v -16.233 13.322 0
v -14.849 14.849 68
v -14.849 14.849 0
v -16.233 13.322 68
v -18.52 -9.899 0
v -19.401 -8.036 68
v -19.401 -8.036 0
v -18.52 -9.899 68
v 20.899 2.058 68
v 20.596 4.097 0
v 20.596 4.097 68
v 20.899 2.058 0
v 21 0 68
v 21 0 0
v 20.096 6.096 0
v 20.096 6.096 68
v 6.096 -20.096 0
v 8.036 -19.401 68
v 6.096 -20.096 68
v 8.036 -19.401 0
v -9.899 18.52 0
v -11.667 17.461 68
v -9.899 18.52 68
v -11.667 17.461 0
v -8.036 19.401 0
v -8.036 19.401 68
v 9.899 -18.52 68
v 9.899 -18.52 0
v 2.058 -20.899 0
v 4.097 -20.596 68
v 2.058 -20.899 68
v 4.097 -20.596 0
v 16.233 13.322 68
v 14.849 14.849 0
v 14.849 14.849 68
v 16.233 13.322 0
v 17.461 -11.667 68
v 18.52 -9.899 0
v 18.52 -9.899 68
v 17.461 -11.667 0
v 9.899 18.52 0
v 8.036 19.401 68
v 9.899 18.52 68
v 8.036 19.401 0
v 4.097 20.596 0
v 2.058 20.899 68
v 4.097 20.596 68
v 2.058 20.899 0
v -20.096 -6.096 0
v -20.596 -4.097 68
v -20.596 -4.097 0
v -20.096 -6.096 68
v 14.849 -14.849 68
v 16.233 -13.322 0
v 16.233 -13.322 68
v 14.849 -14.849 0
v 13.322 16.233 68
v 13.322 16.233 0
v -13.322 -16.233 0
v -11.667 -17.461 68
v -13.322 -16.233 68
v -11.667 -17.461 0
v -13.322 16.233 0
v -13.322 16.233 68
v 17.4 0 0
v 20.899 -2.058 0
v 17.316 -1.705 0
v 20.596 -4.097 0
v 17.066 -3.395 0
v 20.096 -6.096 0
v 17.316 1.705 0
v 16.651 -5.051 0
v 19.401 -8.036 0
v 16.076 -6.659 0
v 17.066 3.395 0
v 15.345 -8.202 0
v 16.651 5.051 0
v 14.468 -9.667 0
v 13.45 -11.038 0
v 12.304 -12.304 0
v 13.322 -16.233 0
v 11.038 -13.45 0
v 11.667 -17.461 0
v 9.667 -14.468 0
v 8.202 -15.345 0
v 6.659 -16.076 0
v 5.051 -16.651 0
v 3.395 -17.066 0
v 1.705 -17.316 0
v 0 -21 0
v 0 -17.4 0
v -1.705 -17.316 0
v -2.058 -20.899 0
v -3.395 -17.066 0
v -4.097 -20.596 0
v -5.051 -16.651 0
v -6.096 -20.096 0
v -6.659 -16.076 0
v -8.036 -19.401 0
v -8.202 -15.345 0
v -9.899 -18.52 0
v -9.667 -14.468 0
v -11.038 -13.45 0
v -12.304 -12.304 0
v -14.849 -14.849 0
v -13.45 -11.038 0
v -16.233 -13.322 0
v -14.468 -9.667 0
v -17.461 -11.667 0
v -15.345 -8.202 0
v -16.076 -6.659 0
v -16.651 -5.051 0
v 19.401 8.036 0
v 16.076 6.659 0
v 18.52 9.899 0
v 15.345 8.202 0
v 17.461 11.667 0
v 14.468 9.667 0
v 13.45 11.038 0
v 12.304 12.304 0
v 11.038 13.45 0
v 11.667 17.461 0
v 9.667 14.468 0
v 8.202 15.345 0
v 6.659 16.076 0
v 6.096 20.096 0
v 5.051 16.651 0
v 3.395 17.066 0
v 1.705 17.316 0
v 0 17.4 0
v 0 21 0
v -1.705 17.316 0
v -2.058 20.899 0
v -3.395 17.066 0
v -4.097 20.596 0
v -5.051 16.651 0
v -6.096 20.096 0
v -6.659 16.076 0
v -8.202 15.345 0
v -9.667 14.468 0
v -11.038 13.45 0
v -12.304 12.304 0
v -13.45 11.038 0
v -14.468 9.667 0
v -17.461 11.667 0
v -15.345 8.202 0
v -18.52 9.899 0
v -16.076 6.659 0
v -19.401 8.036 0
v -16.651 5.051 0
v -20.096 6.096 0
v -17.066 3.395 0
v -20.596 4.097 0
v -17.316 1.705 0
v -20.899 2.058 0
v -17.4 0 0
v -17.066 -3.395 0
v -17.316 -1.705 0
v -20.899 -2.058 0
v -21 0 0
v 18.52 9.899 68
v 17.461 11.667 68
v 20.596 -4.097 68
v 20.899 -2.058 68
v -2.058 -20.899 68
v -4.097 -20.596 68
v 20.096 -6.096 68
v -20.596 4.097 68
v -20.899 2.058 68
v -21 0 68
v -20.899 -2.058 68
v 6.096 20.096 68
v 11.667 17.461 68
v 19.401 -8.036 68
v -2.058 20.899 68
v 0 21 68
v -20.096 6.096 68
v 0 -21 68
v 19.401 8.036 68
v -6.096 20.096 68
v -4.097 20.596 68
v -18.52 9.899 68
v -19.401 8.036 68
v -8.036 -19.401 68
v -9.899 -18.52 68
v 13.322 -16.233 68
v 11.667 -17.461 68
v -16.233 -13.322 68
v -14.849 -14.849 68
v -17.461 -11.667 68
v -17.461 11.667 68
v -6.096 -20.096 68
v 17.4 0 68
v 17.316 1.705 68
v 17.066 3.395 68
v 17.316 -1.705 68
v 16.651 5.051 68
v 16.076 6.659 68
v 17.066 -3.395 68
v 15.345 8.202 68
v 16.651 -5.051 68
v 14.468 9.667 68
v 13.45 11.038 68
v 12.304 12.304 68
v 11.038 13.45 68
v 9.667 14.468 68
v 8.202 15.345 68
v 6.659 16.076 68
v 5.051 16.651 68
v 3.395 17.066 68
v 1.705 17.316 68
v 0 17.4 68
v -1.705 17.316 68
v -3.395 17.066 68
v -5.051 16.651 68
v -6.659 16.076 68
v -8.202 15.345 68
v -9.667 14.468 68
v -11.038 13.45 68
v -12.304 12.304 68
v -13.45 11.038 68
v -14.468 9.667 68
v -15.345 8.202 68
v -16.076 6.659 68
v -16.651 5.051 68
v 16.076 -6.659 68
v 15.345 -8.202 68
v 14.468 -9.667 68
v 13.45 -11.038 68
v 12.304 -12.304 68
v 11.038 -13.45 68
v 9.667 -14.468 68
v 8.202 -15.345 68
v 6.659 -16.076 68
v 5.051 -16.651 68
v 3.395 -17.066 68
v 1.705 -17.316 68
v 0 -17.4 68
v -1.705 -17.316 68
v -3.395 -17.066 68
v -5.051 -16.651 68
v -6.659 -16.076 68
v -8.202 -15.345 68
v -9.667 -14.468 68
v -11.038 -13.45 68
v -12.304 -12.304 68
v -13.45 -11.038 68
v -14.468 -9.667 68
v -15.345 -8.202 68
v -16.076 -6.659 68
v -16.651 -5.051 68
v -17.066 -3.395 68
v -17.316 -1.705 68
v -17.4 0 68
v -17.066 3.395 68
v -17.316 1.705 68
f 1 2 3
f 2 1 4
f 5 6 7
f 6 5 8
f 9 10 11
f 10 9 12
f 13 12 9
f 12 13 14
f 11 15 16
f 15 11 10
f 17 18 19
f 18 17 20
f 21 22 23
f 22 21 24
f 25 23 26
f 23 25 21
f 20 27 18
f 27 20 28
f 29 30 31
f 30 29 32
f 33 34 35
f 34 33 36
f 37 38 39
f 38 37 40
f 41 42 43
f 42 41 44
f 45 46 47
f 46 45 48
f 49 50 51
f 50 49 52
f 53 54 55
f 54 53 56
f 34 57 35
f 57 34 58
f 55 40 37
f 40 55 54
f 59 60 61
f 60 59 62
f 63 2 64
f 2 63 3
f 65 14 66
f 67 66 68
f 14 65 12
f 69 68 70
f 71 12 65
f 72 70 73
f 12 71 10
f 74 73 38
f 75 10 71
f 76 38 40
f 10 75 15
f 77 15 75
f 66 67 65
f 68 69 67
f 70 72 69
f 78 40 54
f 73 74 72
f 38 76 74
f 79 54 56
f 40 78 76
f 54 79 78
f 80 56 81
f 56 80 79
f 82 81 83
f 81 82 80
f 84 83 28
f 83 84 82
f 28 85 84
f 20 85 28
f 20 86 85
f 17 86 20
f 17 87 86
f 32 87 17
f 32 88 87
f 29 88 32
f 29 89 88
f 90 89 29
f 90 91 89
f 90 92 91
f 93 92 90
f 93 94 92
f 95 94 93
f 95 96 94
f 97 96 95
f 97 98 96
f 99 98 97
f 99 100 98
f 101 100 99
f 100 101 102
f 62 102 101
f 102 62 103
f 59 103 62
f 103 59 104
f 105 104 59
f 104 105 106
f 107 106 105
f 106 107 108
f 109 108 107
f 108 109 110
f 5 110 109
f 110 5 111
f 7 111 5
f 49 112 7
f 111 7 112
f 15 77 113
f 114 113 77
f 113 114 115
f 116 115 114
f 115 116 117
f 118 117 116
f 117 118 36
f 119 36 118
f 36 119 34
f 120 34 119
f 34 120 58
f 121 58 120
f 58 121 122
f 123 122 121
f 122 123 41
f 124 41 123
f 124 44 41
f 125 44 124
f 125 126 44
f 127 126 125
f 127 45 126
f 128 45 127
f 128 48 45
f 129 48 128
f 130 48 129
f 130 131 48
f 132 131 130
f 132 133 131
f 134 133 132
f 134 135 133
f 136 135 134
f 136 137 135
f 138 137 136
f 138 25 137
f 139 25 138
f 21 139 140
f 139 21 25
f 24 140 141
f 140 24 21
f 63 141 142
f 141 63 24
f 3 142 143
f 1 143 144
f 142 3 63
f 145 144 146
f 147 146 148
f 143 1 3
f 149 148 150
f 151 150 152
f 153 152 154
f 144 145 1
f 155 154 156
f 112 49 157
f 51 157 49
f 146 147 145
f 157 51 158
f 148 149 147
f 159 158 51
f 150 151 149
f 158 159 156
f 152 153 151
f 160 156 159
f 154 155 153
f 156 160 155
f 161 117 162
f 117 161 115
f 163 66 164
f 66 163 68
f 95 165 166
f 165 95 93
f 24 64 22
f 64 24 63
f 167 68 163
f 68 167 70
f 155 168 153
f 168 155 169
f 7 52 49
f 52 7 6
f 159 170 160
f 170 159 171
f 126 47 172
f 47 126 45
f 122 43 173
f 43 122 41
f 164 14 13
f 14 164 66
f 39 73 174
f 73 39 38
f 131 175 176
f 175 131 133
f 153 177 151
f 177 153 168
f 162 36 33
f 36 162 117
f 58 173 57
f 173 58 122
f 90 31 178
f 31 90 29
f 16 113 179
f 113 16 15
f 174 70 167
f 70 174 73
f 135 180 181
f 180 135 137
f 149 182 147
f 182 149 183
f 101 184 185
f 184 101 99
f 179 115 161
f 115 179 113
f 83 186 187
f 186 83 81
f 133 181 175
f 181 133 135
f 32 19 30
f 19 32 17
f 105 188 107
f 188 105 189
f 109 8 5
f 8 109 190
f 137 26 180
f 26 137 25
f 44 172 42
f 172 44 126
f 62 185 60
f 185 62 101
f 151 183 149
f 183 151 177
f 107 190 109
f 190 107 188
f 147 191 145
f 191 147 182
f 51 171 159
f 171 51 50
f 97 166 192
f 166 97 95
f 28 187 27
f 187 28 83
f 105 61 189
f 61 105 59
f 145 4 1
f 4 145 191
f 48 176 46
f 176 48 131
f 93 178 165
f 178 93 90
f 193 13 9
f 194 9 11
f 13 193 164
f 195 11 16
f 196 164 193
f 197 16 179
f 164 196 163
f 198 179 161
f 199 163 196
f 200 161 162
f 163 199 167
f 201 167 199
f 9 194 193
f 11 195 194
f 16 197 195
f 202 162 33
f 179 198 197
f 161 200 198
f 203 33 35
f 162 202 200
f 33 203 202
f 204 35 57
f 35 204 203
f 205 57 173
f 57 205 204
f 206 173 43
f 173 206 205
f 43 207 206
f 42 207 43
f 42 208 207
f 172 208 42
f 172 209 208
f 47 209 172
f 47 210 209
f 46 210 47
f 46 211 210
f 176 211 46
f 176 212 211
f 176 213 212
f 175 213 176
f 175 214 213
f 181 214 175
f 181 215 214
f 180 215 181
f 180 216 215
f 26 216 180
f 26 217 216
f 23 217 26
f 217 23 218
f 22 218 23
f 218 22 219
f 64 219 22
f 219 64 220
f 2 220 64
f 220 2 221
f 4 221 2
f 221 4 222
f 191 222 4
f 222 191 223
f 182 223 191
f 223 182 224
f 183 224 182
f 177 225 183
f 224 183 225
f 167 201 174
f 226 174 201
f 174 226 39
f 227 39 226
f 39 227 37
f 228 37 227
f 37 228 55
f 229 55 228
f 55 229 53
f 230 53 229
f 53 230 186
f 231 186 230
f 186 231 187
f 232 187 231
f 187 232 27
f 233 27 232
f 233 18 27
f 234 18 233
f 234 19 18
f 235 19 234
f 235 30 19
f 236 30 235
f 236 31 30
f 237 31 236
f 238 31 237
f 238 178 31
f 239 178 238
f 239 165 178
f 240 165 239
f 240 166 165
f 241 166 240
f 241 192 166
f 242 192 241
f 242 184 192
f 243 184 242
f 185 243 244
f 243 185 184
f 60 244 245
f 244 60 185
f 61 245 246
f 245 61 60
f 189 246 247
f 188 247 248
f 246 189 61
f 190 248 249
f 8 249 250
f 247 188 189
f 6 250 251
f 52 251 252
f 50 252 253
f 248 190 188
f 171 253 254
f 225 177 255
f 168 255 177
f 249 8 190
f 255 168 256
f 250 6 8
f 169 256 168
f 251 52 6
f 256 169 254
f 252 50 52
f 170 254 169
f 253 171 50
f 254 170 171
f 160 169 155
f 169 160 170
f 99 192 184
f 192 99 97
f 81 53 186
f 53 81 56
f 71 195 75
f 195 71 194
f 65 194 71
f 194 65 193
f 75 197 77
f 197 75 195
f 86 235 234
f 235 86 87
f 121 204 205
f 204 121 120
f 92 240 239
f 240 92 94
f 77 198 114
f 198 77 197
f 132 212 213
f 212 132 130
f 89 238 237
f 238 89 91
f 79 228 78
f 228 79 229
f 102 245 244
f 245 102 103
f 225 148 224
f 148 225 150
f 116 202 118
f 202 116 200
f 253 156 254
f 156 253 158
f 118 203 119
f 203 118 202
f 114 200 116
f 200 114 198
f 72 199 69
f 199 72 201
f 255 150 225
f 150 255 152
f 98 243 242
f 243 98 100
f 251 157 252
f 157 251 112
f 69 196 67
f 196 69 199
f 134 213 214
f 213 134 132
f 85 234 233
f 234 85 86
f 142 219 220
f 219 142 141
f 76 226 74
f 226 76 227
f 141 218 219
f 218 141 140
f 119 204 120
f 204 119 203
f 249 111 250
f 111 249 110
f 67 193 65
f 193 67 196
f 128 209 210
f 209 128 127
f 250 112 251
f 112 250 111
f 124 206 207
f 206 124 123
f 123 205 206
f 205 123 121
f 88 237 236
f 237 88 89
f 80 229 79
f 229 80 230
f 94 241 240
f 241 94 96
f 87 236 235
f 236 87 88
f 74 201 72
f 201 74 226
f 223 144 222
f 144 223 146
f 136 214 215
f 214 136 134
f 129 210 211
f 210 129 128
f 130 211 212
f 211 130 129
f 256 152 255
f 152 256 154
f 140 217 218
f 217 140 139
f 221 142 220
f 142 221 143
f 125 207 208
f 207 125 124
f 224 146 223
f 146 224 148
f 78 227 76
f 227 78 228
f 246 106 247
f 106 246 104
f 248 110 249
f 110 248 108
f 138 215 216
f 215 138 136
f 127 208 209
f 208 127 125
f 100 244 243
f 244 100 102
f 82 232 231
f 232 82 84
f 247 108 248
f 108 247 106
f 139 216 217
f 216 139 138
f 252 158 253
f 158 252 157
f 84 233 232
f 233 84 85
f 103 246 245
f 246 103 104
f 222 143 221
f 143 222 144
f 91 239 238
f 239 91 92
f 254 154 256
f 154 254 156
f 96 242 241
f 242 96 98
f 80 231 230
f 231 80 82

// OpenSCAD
// file: ../../config.scad
// Ebike Configuration
// All dimensions in mm

// =============================================================================
// RIDER PARAMETERS
// =============================================================================
rider_height = 173;
rider_weight = 55;

// =============================================================================
// FRAME GEOMETRY
// =============================================================================
frame_size = 520;                    // Seat tube center-to-top
top_tube_effective = 545;
head_tube_length = 140;
head_tube_angle = 70;
seat_tube_angle = 72;
chainstay_length = 460;
bb_drop = 65;
wheelbase = 1080;
standover_height = 450;              // Step-through
stack = 620;
reach = 370;

// =============================================================================
// TUBE DIAMETERS
// =============================================================================
head_tube_id = 44;                   // 1-1/8" straight steerer
head_tube_od = 49;
seat_tube_id = 27.2;                 // Standard seatpost
down_tube_od = 44;
top_tube_od = 32;
seat_stay_od = 16;
chainstay_od = 22;

// =============================================================================
// MOTOR CONFIGURATION
// =============================================================================
motor_type = "mid-drive";
bb_shell_width = 68;                 // BSA standard
bb_clearance_width = 120;

// =============================================================================
// DROPOUT PARAMETERS
// =============================================================================
dropout_material = "6061-T6";
dropout_thickness = 10;
dropout_width = 45;
dropout_height = 80;
dropout_axle_spacing = 142;          // Boost thru-axle
dropout_axle_diameter = 12;

// =============================================================================
// BOTTOM BRACKET SHELL
// =============================================================================
bb_shell_od = 42;
bb_shell_id = 34.8;                  // BSA threaded
bb_thread_tpi = 24;                  // BSA 1.37" x 24 TPI

// =============================================================================
// HEAD TUBE
// =============================================================================
// Uses head_tube_length, head_tube_id, head_tube_od from above

// =============================================================================
// SEAT COLLAR
// =============================================================================
seat_collar_id = 31.8;               // For 27.2mm post with shim
seat_collar_od = 38;
seat_collar_height = 25;

// =============================================================================
// MOTOR MOUNT
// =============================================================================
motor_mount_thickness = 8;
motor_mount_width = 120;
motor_mount_height = 100;

// =============================================================================
// BATTERY MOUNT
// =============================================================================
battery_mount_thickness = 6;
battery_mount_width = 60;
battery_mount_height = 40;
battery_mount_quantity = 4;

// =============================================================================
// BRAKE MOUNT (Post Mount)
// =============================================================================
brake_mount_thickness = 10;
brake_mount_width = 80;
brake_mount_height = 50;
brake_post_bolt_spacing = 74;        // Post mount standard
brake_rotor_size_front = 180;
brake_rotor_size_rear = 160;

// =============================================================================
// CABLE GUIDES
// =============================================================================
cable_guide_length = 25;
cable_guide_width = 15;
cable_guide_height = 8;
cable_guide_quantity = 6;

// =============================================================================
// HEADSET CUPS
// =============================================================================
headset_cup_od = 44;
headset_bearing_seat = 30;

// =============================================================================
// RACK/FENDER MOUNTS
// =============================================================================
rack_mount_length = 30;
rack_mount_width = 20;
rack_mount_height = 10;
rack_mount_thread = 5;               // M5
rack_mount_quantity = 4;

// =============================================================================
// GUSSET PLATES
// =============================================================================
gusset_thickness = 6;
gusset_width = 80;
gusset_height = 60;
gusset_quantity = 2;

// =============================================================================
// COMPOSITE FRAME TUBES (FibreSeeker 3)
// =============================================================================
// Wall thickness for carbon fiber reinforced tubes
tube_wall_thickness = 3;

// Down tube (curved for step-through)
down_tube_length = 650;              // Along curve
down_tube_curve_radius = 800;        // Radius of curve

// Seat tube
seat_tube_length = 520;              // frame_size
seat_tube_od = 34;                   // Outer diameter

// Chainstays
chainstay_wall = 2.5;

// Seat stays
seat_stay_length = 480;
seat_stay_wall = 2;

// =============================================================================
// TUBE SECTIONING (for build volume constraints)
// =============================================================================
// Joint design: internal aluminum sleeve with M6 through-bolts
joint_overlap = 30;                  // Overlap length per joint
joint_bolt_diameter = 6;             // M6 bolts
joint_bolt_count = 2;                // Bolts per joint

// Section counts
down_tube_sections = 3;
seat_tube_sections = 2;
chainstay_sections = 2;
seat_stay_sections = 2;

// Sleeve parameters (CNC milled aluminum)
sleeve_wall_thickness = 2;
sleeve_length = 60;                  // Total sleeve length (2x overlap)

// =============================================================================
// MANUFACTURING TOLERANCES
// =============================================================================
tolerance_press_fit = 0.05;
tolerance_general = 0.1;

// =============================================================================
// COMMON CONSTANTS
// =============================================================================
$fn = 64;                            // Circle resolution
epsilon = 0.01;                      // For boolean operations
// main file
// Bottom Bracket Shell
// CNC milled component for NestWorks C500

include <../../config.scad>

module bb_shell() {
    difference() {
        // Outer cylinder
        cylinder(h = bb_shell_width, d = bb_shell_od);

        // Inner bore (threaded)
        translate([0, 0, -epsilon])
            cylinder(h = bb_shell_width + 2*epsilon, d = bb_shell_id);
    }
}

// Render for preview
bb_shell();
